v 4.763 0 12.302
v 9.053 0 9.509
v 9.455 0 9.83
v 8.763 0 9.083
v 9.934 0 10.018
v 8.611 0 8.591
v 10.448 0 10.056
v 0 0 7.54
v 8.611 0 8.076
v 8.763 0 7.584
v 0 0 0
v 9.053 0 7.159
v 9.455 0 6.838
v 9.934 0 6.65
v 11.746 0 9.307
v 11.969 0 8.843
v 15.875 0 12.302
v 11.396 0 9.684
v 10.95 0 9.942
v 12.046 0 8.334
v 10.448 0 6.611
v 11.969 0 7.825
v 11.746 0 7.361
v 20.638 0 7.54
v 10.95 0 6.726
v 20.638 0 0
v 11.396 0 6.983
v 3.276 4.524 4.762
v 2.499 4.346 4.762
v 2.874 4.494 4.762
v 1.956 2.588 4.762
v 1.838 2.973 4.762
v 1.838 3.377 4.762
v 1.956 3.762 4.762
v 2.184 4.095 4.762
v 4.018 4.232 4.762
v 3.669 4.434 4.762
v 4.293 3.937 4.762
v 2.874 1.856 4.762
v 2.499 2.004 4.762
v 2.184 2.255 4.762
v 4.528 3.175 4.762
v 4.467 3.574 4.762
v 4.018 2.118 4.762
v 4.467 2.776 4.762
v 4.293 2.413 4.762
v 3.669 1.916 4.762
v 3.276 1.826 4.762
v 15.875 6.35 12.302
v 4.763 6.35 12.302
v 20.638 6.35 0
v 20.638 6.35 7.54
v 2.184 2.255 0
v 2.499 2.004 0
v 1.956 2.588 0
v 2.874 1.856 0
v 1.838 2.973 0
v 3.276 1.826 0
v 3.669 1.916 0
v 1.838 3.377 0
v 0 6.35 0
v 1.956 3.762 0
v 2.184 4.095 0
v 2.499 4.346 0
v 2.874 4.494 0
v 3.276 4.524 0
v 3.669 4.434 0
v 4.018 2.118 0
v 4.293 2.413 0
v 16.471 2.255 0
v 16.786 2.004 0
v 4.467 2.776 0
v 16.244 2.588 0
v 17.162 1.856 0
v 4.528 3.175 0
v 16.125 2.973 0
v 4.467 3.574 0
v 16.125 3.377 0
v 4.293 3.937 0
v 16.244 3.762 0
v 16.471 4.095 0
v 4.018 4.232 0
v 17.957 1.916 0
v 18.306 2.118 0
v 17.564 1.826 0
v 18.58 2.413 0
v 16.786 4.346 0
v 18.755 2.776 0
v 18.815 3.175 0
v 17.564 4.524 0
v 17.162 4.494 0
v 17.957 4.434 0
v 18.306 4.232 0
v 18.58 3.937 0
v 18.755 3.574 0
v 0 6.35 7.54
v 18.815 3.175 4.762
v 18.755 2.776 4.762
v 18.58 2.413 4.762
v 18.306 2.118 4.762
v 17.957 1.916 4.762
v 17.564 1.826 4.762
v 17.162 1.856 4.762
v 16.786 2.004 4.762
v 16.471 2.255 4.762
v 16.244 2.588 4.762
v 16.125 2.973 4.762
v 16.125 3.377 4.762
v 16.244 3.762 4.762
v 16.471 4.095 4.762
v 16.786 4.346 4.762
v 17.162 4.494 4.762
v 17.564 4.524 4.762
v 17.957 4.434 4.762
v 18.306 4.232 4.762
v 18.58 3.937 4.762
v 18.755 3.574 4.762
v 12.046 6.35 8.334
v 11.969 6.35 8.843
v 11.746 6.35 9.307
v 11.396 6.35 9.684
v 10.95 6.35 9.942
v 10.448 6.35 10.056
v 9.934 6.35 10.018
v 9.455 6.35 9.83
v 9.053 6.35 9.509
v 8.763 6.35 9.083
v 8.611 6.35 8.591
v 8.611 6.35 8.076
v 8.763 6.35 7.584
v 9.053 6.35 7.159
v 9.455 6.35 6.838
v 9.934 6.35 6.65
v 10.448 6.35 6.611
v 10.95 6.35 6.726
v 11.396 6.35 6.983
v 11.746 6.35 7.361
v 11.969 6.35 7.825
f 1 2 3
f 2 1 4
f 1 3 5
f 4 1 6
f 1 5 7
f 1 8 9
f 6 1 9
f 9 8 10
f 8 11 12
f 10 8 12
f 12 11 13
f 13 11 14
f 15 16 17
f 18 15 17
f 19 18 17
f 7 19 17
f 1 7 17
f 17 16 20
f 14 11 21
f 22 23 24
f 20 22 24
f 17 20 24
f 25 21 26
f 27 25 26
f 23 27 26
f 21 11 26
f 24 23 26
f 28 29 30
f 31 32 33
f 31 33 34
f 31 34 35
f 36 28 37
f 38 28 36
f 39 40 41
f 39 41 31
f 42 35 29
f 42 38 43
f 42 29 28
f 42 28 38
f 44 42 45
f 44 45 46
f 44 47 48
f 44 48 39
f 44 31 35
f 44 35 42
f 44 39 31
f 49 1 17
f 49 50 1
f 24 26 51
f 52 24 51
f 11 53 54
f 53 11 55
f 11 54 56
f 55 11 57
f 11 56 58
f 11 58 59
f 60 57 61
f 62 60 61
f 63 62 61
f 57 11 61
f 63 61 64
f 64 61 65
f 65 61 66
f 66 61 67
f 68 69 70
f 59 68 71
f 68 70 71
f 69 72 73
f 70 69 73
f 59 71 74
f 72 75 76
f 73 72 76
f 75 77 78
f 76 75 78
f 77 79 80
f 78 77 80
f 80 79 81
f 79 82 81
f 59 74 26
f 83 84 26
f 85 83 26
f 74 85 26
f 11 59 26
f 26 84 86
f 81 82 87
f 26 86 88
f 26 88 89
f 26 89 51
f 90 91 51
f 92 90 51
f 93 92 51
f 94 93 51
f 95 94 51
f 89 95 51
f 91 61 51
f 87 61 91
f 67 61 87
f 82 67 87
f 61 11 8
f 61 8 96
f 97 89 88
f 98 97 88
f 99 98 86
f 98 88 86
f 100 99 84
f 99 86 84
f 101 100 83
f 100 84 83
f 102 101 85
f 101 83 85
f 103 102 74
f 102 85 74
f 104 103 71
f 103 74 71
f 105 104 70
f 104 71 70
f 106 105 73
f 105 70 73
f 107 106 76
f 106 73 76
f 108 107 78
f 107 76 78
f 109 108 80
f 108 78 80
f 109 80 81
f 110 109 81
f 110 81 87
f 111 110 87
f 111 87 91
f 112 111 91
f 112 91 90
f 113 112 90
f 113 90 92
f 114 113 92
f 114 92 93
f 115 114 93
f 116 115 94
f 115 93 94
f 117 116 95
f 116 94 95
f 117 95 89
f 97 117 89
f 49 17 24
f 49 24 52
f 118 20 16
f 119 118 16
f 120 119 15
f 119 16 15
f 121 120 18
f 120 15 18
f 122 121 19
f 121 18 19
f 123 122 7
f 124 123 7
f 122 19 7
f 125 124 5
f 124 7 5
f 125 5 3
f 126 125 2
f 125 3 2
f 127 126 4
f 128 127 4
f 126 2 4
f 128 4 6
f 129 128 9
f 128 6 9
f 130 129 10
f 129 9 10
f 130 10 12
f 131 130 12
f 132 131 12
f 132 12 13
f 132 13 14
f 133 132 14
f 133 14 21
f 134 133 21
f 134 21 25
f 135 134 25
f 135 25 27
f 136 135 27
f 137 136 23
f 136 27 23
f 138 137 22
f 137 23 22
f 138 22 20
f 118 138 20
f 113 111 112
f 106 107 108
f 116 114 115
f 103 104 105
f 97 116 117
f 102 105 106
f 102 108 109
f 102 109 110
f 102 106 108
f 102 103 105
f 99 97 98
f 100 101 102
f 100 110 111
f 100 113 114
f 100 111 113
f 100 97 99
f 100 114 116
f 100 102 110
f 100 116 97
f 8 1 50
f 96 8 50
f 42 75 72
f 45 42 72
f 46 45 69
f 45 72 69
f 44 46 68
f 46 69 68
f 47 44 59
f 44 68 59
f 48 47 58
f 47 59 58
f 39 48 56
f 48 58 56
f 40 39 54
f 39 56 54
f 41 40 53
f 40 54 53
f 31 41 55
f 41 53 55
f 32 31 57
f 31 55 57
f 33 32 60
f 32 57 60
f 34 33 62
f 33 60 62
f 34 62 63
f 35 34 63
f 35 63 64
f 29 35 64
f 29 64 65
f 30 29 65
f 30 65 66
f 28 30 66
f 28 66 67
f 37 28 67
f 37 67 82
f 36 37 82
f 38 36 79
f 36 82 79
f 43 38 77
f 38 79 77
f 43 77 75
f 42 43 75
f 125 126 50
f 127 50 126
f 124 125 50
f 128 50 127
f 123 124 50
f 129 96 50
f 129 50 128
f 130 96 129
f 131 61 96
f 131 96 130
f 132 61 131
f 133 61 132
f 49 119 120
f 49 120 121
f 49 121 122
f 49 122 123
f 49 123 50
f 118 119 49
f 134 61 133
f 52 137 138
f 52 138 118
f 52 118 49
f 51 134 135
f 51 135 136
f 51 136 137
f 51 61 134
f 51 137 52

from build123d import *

# Parameters (mm, degrees)
F0_W     = 20.6375
F0_H     = 6.35
F1_DEPTH = 12.30249
F2_R     = 1.7272
F3_DEPTH = 6.35
F4_R     = 1.35255
F5_DEPTH = 4.7625
F6_SIZE  = 4.7625


with BuildPart() as f1:
    # F0 (on Top) → F1 (new body)
    with BuildSketch(Plane.XY):
        with Locations((10.31875, 3.175)):
            Rectangle(F0_W, F0_H)
    extrude(amount=F1_DEPTH)

    # F2 (on face) → F3 (cut, through all)
    with BuildSketch(Plane.XZ):
        with Locations((10.31875, 8.33374)):
            Circle(F2_R)
    extrude(amount=-F3_DEPTH, mode=Mode.SUBTRACT)

    # F4 (on face) → F5 (cut)
    with BuildSketch(Plane(origin=(0, 0, 0), x_dir=(1, 0, 0), z_dir=(0, 0, -1))):
        with Locations((3.175, -3.175)):
            Circle(F4_R)
        with Locations((17.4625, -3.175)):
            Circle(F4_R)
    extrude(amount=-F5_DEPTH, mode=Mode.SUBTRACT)

    # F6
    f6_edges = [f1.edges().sort_by_distance(p)[0] for p in [
        (0, 3.175, 12.30249),
        (20.6375, 3.175, 12.30249),
    ]]
    chamfer(f6_edges, length=F6_SIZE)


solid = f1.part
